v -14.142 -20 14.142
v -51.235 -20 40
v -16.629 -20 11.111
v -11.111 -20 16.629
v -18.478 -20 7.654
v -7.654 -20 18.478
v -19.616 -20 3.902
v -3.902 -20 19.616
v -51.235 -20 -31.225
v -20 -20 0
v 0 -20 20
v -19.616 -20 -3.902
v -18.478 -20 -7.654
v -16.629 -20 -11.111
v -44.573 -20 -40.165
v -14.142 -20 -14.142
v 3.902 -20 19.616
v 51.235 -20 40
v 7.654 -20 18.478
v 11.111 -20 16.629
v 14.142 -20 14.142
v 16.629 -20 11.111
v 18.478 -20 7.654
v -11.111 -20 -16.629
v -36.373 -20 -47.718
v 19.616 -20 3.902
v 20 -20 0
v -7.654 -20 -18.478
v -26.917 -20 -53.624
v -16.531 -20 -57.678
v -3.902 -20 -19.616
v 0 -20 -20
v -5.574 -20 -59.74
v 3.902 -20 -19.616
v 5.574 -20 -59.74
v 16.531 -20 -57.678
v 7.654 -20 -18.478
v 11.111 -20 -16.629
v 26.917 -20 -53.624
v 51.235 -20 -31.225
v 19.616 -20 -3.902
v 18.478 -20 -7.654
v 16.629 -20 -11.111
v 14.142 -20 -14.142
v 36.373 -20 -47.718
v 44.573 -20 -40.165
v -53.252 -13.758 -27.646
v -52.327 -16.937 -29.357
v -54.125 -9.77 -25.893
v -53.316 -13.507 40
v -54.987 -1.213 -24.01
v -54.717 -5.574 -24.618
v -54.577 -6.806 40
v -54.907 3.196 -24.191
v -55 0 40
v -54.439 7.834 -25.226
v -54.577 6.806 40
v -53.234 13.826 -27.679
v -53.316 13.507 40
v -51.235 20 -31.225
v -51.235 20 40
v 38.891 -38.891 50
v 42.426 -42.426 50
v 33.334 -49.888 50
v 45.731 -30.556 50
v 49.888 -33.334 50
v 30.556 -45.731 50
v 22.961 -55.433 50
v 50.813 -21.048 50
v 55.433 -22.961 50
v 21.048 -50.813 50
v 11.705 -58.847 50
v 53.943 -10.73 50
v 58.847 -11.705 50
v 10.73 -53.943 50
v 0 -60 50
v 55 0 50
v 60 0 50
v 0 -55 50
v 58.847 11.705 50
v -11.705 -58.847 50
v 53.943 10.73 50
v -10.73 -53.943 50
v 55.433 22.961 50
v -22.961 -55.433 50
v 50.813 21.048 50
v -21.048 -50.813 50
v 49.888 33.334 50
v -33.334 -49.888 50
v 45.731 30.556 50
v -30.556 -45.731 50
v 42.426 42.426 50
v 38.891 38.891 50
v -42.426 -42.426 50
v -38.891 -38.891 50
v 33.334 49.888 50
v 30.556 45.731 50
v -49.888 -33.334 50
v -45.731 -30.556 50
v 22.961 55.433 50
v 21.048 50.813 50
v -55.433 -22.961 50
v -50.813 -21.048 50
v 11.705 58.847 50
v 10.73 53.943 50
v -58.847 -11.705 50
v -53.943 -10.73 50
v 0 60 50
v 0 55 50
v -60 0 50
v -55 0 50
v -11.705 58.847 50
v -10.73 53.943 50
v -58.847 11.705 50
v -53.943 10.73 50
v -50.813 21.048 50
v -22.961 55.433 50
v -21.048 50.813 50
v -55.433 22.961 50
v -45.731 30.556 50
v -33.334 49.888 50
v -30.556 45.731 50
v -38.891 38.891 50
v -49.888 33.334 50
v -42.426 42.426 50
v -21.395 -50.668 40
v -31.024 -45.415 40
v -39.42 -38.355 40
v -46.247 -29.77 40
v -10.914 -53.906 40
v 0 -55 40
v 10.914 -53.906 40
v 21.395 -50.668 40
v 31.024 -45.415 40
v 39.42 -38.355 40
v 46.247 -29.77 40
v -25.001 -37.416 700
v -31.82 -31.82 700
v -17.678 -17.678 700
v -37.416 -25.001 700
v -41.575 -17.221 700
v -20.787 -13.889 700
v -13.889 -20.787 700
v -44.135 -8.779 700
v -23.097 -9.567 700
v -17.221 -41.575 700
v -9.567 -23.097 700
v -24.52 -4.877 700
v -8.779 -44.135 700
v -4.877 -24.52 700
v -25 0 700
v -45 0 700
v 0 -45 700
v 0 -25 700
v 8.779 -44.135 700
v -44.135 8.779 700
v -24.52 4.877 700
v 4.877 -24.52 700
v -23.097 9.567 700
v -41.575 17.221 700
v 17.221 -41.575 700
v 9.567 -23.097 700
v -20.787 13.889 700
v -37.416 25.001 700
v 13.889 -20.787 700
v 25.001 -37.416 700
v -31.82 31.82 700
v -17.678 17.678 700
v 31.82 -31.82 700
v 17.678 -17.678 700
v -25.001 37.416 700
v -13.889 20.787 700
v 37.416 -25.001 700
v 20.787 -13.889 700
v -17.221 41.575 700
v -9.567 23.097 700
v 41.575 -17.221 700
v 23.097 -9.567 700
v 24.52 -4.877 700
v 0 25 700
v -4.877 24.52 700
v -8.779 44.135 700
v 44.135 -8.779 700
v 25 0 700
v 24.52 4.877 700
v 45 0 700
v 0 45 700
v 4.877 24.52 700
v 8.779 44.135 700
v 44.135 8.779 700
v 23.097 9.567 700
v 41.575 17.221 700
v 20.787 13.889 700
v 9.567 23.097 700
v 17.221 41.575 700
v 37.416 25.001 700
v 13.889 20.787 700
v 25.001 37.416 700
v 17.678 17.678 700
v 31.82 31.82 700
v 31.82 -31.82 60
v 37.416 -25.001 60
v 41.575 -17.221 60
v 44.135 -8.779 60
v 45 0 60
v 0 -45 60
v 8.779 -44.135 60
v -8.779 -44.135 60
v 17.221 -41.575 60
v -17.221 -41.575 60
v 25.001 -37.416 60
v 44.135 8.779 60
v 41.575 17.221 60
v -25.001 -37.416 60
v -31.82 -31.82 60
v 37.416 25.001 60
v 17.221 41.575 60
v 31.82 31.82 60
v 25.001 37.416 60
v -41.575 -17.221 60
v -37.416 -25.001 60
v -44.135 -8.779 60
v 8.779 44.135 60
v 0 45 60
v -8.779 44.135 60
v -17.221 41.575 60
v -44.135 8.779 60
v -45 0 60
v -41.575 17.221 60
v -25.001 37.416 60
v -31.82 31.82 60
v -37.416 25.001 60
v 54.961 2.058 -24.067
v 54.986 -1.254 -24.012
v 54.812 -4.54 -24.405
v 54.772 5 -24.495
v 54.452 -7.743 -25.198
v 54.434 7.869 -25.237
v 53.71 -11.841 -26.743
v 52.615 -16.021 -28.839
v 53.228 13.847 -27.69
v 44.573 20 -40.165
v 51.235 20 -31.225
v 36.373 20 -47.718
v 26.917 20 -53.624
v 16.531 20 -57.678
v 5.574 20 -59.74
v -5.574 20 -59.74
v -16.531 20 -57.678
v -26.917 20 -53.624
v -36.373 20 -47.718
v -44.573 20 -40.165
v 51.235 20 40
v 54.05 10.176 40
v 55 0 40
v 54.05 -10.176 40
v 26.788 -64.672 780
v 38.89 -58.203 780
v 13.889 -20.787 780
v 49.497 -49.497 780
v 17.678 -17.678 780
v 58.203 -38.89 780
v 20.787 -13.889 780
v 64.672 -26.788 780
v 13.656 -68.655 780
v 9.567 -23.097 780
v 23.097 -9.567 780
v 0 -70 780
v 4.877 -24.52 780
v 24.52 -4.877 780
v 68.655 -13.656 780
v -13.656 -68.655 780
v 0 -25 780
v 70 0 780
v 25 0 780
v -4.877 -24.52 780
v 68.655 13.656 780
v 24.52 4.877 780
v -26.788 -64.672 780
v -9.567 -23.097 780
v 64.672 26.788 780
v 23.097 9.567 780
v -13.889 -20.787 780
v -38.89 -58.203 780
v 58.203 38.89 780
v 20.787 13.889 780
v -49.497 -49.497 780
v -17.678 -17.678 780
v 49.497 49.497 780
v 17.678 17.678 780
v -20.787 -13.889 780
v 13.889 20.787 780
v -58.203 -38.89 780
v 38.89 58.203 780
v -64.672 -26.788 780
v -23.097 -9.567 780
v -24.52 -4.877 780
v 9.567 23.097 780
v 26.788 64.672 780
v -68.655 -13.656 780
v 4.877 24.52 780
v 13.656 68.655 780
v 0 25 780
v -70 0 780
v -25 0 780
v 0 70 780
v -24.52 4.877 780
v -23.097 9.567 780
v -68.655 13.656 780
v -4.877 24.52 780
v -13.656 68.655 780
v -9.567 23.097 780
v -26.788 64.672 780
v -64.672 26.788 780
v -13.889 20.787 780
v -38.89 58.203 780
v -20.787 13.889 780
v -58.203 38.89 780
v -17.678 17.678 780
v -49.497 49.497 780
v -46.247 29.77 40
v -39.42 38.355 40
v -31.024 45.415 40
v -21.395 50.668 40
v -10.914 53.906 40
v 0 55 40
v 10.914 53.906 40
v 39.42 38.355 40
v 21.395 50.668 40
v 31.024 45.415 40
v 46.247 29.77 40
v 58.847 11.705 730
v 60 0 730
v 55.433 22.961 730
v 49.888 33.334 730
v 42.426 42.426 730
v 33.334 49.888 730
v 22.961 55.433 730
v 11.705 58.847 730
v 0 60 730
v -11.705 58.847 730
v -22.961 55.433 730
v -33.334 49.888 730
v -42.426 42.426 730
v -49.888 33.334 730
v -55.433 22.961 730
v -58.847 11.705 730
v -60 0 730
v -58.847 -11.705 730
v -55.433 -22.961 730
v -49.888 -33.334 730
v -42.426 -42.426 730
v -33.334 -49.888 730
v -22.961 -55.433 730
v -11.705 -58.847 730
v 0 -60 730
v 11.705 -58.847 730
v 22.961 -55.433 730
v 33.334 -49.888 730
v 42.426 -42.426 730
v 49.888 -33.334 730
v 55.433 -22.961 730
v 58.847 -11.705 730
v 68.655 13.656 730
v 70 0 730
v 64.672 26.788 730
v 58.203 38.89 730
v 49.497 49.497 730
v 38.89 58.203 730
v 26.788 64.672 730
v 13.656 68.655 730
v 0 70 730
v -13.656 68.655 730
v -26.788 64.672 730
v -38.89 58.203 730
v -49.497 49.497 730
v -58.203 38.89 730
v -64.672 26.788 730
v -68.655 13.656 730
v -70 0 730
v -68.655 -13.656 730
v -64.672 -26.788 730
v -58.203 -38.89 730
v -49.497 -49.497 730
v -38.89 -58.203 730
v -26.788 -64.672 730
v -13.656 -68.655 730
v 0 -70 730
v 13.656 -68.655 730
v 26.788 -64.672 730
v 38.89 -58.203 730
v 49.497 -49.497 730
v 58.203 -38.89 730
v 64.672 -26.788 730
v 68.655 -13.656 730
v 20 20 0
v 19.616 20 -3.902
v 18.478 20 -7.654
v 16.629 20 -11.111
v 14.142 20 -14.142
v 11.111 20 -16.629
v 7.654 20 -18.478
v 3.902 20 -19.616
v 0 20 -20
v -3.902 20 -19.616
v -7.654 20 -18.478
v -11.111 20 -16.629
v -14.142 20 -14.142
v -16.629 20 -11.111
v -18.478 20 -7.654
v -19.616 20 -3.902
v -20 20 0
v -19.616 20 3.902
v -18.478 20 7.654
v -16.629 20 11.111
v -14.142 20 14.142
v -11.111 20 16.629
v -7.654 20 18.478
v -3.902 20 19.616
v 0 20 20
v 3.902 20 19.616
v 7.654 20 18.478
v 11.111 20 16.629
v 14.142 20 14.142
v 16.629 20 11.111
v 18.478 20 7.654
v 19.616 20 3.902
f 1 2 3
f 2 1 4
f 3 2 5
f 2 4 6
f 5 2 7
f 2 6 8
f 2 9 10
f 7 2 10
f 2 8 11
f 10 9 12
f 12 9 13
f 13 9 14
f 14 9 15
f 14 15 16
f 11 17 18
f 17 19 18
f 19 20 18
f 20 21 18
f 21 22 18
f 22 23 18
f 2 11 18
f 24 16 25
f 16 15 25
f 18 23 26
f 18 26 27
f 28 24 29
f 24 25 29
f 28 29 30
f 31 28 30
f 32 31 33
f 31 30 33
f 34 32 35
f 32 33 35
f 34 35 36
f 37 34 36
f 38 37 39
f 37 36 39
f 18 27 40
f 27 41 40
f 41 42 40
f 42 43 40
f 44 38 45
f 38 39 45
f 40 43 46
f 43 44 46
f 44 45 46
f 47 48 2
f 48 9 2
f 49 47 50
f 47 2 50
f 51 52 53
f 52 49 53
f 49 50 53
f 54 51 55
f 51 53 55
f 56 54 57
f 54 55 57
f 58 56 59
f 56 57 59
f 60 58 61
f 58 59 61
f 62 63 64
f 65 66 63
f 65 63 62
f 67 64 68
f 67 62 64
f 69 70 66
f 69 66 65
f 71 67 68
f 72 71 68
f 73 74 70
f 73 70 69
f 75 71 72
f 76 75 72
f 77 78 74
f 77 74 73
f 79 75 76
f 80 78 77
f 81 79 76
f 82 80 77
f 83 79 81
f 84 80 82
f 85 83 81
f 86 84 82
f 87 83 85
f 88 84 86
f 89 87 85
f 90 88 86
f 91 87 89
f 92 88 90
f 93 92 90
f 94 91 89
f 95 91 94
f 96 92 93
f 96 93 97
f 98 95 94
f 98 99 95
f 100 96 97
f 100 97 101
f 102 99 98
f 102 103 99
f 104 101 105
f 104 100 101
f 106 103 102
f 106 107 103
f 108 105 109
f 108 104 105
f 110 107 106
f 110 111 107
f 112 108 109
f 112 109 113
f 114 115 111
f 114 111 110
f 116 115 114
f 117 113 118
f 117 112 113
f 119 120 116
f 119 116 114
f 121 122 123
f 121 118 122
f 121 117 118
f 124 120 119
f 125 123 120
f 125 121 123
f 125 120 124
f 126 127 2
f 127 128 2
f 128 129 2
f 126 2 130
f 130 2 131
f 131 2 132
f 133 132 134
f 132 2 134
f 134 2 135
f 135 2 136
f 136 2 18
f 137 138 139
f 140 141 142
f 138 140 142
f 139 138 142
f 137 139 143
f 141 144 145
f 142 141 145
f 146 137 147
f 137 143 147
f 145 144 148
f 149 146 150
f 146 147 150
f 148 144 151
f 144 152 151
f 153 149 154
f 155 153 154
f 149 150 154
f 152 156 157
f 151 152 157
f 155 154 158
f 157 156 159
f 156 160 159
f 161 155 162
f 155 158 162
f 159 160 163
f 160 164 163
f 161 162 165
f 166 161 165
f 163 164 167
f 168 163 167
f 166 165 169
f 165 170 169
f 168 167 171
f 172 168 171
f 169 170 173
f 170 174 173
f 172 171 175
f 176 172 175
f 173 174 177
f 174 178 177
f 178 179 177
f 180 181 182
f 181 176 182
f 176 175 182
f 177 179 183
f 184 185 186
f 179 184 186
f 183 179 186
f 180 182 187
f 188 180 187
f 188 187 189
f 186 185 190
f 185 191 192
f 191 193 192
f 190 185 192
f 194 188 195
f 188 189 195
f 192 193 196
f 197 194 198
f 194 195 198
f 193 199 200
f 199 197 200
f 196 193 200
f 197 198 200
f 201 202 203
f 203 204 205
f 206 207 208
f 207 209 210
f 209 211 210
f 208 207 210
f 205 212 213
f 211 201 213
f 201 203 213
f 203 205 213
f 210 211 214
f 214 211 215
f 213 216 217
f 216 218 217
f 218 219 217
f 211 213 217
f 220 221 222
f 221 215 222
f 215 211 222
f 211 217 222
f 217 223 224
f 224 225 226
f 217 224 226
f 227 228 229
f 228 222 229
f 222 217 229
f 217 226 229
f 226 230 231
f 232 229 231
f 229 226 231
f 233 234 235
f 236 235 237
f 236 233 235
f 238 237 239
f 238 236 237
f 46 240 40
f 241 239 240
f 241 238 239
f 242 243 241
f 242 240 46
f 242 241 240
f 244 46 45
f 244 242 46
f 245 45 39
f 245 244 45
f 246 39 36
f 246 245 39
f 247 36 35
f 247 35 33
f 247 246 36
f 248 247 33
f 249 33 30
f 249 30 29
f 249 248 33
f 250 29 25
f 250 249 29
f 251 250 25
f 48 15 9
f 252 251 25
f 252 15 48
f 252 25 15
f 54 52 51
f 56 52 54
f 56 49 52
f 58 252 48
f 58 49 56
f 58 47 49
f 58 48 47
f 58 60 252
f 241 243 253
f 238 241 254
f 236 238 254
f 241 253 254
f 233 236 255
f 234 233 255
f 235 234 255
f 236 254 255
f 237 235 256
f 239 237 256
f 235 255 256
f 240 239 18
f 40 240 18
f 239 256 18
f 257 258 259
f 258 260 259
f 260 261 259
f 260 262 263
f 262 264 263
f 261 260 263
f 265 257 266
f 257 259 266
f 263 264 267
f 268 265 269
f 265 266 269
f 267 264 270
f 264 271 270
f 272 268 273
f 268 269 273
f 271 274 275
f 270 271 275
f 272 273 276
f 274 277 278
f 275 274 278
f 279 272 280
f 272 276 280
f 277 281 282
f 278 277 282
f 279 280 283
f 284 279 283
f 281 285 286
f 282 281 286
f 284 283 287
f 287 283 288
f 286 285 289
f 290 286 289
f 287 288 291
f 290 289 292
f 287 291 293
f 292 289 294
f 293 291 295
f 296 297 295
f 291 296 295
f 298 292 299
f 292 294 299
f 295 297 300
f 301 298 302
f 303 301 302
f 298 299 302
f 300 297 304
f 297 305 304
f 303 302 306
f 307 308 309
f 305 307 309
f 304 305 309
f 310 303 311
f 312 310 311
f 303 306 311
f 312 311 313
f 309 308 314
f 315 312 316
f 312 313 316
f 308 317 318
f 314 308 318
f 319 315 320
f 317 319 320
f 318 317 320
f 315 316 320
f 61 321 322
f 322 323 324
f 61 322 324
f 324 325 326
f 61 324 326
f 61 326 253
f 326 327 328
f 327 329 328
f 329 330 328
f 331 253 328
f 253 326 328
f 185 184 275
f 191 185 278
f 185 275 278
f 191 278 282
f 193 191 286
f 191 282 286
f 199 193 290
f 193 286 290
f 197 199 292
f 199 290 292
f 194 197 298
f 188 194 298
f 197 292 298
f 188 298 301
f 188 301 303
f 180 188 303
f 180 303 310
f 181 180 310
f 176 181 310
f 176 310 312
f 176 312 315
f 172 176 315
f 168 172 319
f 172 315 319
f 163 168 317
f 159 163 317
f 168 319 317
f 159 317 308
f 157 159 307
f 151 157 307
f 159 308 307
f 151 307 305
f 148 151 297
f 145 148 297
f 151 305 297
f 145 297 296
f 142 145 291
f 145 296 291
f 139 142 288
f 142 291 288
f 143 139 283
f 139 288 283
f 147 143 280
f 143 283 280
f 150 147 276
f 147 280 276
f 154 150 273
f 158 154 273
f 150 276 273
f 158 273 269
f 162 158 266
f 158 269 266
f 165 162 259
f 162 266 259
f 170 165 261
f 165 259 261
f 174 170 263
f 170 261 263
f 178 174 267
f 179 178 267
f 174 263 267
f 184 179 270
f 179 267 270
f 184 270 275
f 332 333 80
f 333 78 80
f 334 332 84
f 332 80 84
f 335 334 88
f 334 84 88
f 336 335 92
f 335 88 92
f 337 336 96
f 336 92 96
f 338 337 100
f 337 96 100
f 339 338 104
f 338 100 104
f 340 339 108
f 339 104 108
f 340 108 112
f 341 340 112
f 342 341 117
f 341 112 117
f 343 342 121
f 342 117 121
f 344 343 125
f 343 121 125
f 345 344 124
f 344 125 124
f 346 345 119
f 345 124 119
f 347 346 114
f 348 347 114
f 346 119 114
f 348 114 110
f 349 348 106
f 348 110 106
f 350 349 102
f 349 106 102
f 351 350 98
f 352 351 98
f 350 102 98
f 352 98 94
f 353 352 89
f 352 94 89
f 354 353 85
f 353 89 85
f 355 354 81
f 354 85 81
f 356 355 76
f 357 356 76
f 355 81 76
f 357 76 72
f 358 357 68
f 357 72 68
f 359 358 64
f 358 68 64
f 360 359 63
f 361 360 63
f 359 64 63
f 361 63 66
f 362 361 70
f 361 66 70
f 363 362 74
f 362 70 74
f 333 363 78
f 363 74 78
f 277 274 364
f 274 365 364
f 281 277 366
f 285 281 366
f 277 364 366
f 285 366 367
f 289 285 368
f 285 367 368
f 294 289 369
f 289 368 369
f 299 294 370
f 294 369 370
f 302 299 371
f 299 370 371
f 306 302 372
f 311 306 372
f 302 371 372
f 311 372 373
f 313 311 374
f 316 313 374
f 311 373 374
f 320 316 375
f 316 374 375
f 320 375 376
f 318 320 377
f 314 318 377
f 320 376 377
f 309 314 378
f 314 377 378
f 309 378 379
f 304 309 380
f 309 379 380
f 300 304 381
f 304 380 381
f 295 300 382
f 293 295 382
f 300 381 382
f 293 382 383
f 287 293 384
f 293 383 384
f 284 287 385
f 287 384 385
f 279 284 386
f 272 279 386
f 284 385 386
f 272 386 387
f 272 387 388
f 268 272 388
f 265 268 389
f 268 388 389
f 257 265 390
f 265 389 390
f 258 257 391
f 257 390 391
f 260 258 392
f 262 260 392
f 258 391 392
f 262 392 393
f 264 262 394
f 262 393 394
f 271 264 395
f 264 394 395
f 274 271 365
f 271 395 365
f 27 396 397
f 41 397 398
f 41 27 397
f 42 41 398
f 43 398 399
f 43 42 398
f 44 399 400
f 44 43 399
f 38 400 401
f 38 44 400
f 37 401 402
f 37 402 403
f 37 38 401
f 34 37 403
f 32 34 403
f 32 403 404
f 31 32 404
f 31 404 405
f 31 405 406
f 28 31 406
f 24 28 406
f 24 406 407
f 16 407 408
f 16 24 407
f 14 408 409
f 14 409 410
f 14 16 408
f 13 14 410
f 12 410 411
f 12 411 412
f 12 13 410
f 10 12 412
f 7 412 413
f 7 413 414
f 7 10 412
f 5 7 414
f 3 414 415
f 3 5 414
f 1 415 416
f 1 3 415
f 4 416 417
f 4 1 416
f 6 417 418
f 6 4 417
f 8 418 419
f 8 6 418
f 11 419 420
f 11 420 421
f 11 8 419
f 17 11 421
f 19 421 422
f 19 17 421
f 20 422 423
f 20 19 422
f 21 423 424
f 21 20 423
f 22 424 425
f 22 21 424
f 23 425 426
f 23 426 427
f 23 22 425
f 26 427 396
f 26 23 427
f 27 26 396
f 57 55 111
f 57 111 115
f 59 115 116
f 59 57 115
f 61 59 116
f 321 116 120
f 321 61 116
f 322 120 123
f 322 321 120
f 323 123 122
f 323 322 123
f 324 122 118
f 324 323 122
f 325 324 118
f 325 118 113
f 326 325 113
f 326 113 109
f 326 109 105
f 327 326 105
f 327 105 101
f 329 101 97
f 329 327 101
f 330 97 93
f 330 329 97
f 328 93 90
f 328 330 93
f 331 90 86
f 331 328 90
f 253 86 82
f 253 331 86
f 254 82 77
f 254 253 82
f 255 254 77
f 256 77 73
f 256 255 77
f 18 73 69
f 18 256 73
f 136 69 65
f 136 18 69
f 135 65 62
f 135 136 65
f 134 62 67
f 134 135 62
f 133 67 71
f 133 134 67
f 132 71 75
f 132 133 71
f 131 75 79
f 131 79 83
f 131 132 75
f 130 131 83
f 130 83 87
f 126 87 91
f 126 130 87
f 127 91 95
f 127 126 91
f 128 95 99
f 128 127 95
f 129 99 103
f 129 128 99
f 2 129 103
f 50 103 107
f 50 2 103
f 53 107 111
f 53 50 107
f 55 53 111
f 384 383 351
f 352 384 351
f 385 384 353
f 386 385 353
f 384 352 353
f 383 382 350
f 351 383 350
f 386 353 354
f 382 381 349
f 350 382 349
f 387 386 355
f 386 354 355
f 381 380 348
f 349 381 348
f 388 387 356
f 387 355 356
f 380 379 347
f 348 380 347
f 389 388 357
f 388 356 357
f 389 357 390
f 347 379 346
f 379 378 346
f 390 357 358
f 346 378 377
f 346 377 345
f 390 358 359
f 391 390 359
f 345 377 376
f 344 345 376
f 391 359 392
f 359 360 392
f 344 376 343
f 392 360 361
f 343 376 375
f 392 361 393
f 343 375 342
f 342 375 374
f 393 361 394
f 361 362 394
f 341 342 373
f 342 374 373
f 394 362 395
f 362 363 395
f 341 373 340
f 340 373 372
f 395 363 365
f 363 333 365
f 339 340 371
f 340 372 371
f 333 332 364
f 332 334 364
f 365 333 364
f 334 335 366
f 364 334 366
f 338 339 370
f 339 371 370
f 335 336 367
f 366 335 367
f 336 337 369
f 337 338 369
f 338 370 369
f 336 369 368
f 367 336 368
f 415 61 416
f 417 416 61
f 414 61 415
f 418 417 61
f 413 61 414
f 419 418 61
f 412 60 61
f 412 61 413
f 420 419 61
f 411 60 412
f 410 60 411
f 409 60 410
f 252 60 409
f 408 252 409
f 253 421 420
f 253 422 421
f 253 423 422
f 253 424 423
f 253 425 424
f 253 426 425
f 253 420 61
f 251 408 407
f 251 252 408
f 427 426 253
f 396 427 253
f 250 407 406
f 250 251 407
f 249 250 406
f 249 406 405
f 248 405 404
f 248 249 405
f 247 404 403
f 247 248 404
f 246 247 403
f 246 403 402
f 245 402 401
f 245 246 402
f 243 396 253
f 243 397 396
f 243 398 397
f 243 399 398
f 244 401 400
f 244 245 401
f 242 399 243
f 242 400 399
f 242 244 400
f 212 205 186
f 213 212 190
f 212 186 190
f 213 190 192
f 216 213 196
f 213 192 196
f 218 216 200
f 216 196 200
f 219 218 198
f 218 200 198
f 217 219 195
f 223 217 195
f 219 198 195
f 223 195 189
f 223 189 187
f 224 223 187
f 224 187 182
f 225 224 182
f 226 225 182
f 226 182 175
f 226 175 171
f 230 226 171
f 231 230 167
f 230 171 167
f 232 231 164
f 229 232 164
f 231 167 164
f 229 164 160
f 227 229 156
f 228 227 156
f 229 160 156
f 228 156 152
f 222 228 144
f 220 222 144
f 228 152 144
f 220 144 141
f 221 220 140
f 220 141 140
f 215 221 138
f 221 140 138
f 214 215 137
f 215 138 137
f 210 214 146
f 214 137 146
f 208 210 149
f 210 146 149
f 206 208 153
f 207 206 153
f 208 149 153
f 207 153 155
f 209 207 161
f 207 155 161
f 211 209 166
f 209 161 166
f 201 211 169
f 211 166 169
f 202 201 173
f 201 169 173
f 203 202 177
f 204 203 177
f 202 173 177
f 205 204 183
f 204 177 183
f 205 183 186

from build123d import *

# Parameters (mm, degrees)
SKETCH2_R               = 20
BOSS_EXTRUDE1_DEPTH     = 20
SKETCH3_R               = 63.245553203
SKETCH3_R_2             = 55
CUT_EXTRUDE1_DEPTH      = 101
CUT_EXTRUDE1_DEPTH_BACK = 10


with BuildPart() as part:
    # Sketch1 → Revolve1 (revolve)
    with BuildSketch(Plane(origin=(0, 0, 0), x_dir=(1, 0, 0), z_dir=(0, 1, 0))):
        Polygon((70, -780), (70, -730), (60, -730), (60, -40), (0, -40), (0, -60), (45, -60), (45, -700), (25, -700), (25, -780), align=None)
    revolve(axis=Axis((0, 0, 0), (0, 0, 1)))

    # Sketch2 → Boss-Extrude1 (add, symmetric)
    with BuildSketch(Plane(origin=(0, 0, 0), x_dir=(1, 0, 0), z_dir=(0, 1, 0))):
        with BuildLine():
            Line((60, -40), (60, 0))
            ThreePointArc((60, 0), (0, 60), (-60, 0))
            Line((-60, 0), (-60, -40))
            Line((-60, -40), (60, -40))
        make_face()
        Circle(SKETCH2_R, mode=Mode.SUBTRACT)
    extrude(amount=BOSS_EXTRUDE1_DEPTH, both=True)

    # Sketch3 → Cut-Extrude1 (cut, two sides)
    with BuildSketch(Plane(origin=(0, 0, 40), x_dir=(-1, 0, 0), z_dir=(0, 0, -1))) as cut_extrude1_sk:
        Circle(SKETCH3_R)
        Circle(SKETCH3_R_2, mode=Mode.SUBTRACT)
    extrude(amount=CUT_EXTRUDE1_DEPTH, mode=Mode.SUBTRACT)
    extrude(cut_extrude1_sk.sketch, amount=-CUT_EXTRUDE1_DEPTH_BACK, mode=Mode.SUBTRACT)


solid = part.part
